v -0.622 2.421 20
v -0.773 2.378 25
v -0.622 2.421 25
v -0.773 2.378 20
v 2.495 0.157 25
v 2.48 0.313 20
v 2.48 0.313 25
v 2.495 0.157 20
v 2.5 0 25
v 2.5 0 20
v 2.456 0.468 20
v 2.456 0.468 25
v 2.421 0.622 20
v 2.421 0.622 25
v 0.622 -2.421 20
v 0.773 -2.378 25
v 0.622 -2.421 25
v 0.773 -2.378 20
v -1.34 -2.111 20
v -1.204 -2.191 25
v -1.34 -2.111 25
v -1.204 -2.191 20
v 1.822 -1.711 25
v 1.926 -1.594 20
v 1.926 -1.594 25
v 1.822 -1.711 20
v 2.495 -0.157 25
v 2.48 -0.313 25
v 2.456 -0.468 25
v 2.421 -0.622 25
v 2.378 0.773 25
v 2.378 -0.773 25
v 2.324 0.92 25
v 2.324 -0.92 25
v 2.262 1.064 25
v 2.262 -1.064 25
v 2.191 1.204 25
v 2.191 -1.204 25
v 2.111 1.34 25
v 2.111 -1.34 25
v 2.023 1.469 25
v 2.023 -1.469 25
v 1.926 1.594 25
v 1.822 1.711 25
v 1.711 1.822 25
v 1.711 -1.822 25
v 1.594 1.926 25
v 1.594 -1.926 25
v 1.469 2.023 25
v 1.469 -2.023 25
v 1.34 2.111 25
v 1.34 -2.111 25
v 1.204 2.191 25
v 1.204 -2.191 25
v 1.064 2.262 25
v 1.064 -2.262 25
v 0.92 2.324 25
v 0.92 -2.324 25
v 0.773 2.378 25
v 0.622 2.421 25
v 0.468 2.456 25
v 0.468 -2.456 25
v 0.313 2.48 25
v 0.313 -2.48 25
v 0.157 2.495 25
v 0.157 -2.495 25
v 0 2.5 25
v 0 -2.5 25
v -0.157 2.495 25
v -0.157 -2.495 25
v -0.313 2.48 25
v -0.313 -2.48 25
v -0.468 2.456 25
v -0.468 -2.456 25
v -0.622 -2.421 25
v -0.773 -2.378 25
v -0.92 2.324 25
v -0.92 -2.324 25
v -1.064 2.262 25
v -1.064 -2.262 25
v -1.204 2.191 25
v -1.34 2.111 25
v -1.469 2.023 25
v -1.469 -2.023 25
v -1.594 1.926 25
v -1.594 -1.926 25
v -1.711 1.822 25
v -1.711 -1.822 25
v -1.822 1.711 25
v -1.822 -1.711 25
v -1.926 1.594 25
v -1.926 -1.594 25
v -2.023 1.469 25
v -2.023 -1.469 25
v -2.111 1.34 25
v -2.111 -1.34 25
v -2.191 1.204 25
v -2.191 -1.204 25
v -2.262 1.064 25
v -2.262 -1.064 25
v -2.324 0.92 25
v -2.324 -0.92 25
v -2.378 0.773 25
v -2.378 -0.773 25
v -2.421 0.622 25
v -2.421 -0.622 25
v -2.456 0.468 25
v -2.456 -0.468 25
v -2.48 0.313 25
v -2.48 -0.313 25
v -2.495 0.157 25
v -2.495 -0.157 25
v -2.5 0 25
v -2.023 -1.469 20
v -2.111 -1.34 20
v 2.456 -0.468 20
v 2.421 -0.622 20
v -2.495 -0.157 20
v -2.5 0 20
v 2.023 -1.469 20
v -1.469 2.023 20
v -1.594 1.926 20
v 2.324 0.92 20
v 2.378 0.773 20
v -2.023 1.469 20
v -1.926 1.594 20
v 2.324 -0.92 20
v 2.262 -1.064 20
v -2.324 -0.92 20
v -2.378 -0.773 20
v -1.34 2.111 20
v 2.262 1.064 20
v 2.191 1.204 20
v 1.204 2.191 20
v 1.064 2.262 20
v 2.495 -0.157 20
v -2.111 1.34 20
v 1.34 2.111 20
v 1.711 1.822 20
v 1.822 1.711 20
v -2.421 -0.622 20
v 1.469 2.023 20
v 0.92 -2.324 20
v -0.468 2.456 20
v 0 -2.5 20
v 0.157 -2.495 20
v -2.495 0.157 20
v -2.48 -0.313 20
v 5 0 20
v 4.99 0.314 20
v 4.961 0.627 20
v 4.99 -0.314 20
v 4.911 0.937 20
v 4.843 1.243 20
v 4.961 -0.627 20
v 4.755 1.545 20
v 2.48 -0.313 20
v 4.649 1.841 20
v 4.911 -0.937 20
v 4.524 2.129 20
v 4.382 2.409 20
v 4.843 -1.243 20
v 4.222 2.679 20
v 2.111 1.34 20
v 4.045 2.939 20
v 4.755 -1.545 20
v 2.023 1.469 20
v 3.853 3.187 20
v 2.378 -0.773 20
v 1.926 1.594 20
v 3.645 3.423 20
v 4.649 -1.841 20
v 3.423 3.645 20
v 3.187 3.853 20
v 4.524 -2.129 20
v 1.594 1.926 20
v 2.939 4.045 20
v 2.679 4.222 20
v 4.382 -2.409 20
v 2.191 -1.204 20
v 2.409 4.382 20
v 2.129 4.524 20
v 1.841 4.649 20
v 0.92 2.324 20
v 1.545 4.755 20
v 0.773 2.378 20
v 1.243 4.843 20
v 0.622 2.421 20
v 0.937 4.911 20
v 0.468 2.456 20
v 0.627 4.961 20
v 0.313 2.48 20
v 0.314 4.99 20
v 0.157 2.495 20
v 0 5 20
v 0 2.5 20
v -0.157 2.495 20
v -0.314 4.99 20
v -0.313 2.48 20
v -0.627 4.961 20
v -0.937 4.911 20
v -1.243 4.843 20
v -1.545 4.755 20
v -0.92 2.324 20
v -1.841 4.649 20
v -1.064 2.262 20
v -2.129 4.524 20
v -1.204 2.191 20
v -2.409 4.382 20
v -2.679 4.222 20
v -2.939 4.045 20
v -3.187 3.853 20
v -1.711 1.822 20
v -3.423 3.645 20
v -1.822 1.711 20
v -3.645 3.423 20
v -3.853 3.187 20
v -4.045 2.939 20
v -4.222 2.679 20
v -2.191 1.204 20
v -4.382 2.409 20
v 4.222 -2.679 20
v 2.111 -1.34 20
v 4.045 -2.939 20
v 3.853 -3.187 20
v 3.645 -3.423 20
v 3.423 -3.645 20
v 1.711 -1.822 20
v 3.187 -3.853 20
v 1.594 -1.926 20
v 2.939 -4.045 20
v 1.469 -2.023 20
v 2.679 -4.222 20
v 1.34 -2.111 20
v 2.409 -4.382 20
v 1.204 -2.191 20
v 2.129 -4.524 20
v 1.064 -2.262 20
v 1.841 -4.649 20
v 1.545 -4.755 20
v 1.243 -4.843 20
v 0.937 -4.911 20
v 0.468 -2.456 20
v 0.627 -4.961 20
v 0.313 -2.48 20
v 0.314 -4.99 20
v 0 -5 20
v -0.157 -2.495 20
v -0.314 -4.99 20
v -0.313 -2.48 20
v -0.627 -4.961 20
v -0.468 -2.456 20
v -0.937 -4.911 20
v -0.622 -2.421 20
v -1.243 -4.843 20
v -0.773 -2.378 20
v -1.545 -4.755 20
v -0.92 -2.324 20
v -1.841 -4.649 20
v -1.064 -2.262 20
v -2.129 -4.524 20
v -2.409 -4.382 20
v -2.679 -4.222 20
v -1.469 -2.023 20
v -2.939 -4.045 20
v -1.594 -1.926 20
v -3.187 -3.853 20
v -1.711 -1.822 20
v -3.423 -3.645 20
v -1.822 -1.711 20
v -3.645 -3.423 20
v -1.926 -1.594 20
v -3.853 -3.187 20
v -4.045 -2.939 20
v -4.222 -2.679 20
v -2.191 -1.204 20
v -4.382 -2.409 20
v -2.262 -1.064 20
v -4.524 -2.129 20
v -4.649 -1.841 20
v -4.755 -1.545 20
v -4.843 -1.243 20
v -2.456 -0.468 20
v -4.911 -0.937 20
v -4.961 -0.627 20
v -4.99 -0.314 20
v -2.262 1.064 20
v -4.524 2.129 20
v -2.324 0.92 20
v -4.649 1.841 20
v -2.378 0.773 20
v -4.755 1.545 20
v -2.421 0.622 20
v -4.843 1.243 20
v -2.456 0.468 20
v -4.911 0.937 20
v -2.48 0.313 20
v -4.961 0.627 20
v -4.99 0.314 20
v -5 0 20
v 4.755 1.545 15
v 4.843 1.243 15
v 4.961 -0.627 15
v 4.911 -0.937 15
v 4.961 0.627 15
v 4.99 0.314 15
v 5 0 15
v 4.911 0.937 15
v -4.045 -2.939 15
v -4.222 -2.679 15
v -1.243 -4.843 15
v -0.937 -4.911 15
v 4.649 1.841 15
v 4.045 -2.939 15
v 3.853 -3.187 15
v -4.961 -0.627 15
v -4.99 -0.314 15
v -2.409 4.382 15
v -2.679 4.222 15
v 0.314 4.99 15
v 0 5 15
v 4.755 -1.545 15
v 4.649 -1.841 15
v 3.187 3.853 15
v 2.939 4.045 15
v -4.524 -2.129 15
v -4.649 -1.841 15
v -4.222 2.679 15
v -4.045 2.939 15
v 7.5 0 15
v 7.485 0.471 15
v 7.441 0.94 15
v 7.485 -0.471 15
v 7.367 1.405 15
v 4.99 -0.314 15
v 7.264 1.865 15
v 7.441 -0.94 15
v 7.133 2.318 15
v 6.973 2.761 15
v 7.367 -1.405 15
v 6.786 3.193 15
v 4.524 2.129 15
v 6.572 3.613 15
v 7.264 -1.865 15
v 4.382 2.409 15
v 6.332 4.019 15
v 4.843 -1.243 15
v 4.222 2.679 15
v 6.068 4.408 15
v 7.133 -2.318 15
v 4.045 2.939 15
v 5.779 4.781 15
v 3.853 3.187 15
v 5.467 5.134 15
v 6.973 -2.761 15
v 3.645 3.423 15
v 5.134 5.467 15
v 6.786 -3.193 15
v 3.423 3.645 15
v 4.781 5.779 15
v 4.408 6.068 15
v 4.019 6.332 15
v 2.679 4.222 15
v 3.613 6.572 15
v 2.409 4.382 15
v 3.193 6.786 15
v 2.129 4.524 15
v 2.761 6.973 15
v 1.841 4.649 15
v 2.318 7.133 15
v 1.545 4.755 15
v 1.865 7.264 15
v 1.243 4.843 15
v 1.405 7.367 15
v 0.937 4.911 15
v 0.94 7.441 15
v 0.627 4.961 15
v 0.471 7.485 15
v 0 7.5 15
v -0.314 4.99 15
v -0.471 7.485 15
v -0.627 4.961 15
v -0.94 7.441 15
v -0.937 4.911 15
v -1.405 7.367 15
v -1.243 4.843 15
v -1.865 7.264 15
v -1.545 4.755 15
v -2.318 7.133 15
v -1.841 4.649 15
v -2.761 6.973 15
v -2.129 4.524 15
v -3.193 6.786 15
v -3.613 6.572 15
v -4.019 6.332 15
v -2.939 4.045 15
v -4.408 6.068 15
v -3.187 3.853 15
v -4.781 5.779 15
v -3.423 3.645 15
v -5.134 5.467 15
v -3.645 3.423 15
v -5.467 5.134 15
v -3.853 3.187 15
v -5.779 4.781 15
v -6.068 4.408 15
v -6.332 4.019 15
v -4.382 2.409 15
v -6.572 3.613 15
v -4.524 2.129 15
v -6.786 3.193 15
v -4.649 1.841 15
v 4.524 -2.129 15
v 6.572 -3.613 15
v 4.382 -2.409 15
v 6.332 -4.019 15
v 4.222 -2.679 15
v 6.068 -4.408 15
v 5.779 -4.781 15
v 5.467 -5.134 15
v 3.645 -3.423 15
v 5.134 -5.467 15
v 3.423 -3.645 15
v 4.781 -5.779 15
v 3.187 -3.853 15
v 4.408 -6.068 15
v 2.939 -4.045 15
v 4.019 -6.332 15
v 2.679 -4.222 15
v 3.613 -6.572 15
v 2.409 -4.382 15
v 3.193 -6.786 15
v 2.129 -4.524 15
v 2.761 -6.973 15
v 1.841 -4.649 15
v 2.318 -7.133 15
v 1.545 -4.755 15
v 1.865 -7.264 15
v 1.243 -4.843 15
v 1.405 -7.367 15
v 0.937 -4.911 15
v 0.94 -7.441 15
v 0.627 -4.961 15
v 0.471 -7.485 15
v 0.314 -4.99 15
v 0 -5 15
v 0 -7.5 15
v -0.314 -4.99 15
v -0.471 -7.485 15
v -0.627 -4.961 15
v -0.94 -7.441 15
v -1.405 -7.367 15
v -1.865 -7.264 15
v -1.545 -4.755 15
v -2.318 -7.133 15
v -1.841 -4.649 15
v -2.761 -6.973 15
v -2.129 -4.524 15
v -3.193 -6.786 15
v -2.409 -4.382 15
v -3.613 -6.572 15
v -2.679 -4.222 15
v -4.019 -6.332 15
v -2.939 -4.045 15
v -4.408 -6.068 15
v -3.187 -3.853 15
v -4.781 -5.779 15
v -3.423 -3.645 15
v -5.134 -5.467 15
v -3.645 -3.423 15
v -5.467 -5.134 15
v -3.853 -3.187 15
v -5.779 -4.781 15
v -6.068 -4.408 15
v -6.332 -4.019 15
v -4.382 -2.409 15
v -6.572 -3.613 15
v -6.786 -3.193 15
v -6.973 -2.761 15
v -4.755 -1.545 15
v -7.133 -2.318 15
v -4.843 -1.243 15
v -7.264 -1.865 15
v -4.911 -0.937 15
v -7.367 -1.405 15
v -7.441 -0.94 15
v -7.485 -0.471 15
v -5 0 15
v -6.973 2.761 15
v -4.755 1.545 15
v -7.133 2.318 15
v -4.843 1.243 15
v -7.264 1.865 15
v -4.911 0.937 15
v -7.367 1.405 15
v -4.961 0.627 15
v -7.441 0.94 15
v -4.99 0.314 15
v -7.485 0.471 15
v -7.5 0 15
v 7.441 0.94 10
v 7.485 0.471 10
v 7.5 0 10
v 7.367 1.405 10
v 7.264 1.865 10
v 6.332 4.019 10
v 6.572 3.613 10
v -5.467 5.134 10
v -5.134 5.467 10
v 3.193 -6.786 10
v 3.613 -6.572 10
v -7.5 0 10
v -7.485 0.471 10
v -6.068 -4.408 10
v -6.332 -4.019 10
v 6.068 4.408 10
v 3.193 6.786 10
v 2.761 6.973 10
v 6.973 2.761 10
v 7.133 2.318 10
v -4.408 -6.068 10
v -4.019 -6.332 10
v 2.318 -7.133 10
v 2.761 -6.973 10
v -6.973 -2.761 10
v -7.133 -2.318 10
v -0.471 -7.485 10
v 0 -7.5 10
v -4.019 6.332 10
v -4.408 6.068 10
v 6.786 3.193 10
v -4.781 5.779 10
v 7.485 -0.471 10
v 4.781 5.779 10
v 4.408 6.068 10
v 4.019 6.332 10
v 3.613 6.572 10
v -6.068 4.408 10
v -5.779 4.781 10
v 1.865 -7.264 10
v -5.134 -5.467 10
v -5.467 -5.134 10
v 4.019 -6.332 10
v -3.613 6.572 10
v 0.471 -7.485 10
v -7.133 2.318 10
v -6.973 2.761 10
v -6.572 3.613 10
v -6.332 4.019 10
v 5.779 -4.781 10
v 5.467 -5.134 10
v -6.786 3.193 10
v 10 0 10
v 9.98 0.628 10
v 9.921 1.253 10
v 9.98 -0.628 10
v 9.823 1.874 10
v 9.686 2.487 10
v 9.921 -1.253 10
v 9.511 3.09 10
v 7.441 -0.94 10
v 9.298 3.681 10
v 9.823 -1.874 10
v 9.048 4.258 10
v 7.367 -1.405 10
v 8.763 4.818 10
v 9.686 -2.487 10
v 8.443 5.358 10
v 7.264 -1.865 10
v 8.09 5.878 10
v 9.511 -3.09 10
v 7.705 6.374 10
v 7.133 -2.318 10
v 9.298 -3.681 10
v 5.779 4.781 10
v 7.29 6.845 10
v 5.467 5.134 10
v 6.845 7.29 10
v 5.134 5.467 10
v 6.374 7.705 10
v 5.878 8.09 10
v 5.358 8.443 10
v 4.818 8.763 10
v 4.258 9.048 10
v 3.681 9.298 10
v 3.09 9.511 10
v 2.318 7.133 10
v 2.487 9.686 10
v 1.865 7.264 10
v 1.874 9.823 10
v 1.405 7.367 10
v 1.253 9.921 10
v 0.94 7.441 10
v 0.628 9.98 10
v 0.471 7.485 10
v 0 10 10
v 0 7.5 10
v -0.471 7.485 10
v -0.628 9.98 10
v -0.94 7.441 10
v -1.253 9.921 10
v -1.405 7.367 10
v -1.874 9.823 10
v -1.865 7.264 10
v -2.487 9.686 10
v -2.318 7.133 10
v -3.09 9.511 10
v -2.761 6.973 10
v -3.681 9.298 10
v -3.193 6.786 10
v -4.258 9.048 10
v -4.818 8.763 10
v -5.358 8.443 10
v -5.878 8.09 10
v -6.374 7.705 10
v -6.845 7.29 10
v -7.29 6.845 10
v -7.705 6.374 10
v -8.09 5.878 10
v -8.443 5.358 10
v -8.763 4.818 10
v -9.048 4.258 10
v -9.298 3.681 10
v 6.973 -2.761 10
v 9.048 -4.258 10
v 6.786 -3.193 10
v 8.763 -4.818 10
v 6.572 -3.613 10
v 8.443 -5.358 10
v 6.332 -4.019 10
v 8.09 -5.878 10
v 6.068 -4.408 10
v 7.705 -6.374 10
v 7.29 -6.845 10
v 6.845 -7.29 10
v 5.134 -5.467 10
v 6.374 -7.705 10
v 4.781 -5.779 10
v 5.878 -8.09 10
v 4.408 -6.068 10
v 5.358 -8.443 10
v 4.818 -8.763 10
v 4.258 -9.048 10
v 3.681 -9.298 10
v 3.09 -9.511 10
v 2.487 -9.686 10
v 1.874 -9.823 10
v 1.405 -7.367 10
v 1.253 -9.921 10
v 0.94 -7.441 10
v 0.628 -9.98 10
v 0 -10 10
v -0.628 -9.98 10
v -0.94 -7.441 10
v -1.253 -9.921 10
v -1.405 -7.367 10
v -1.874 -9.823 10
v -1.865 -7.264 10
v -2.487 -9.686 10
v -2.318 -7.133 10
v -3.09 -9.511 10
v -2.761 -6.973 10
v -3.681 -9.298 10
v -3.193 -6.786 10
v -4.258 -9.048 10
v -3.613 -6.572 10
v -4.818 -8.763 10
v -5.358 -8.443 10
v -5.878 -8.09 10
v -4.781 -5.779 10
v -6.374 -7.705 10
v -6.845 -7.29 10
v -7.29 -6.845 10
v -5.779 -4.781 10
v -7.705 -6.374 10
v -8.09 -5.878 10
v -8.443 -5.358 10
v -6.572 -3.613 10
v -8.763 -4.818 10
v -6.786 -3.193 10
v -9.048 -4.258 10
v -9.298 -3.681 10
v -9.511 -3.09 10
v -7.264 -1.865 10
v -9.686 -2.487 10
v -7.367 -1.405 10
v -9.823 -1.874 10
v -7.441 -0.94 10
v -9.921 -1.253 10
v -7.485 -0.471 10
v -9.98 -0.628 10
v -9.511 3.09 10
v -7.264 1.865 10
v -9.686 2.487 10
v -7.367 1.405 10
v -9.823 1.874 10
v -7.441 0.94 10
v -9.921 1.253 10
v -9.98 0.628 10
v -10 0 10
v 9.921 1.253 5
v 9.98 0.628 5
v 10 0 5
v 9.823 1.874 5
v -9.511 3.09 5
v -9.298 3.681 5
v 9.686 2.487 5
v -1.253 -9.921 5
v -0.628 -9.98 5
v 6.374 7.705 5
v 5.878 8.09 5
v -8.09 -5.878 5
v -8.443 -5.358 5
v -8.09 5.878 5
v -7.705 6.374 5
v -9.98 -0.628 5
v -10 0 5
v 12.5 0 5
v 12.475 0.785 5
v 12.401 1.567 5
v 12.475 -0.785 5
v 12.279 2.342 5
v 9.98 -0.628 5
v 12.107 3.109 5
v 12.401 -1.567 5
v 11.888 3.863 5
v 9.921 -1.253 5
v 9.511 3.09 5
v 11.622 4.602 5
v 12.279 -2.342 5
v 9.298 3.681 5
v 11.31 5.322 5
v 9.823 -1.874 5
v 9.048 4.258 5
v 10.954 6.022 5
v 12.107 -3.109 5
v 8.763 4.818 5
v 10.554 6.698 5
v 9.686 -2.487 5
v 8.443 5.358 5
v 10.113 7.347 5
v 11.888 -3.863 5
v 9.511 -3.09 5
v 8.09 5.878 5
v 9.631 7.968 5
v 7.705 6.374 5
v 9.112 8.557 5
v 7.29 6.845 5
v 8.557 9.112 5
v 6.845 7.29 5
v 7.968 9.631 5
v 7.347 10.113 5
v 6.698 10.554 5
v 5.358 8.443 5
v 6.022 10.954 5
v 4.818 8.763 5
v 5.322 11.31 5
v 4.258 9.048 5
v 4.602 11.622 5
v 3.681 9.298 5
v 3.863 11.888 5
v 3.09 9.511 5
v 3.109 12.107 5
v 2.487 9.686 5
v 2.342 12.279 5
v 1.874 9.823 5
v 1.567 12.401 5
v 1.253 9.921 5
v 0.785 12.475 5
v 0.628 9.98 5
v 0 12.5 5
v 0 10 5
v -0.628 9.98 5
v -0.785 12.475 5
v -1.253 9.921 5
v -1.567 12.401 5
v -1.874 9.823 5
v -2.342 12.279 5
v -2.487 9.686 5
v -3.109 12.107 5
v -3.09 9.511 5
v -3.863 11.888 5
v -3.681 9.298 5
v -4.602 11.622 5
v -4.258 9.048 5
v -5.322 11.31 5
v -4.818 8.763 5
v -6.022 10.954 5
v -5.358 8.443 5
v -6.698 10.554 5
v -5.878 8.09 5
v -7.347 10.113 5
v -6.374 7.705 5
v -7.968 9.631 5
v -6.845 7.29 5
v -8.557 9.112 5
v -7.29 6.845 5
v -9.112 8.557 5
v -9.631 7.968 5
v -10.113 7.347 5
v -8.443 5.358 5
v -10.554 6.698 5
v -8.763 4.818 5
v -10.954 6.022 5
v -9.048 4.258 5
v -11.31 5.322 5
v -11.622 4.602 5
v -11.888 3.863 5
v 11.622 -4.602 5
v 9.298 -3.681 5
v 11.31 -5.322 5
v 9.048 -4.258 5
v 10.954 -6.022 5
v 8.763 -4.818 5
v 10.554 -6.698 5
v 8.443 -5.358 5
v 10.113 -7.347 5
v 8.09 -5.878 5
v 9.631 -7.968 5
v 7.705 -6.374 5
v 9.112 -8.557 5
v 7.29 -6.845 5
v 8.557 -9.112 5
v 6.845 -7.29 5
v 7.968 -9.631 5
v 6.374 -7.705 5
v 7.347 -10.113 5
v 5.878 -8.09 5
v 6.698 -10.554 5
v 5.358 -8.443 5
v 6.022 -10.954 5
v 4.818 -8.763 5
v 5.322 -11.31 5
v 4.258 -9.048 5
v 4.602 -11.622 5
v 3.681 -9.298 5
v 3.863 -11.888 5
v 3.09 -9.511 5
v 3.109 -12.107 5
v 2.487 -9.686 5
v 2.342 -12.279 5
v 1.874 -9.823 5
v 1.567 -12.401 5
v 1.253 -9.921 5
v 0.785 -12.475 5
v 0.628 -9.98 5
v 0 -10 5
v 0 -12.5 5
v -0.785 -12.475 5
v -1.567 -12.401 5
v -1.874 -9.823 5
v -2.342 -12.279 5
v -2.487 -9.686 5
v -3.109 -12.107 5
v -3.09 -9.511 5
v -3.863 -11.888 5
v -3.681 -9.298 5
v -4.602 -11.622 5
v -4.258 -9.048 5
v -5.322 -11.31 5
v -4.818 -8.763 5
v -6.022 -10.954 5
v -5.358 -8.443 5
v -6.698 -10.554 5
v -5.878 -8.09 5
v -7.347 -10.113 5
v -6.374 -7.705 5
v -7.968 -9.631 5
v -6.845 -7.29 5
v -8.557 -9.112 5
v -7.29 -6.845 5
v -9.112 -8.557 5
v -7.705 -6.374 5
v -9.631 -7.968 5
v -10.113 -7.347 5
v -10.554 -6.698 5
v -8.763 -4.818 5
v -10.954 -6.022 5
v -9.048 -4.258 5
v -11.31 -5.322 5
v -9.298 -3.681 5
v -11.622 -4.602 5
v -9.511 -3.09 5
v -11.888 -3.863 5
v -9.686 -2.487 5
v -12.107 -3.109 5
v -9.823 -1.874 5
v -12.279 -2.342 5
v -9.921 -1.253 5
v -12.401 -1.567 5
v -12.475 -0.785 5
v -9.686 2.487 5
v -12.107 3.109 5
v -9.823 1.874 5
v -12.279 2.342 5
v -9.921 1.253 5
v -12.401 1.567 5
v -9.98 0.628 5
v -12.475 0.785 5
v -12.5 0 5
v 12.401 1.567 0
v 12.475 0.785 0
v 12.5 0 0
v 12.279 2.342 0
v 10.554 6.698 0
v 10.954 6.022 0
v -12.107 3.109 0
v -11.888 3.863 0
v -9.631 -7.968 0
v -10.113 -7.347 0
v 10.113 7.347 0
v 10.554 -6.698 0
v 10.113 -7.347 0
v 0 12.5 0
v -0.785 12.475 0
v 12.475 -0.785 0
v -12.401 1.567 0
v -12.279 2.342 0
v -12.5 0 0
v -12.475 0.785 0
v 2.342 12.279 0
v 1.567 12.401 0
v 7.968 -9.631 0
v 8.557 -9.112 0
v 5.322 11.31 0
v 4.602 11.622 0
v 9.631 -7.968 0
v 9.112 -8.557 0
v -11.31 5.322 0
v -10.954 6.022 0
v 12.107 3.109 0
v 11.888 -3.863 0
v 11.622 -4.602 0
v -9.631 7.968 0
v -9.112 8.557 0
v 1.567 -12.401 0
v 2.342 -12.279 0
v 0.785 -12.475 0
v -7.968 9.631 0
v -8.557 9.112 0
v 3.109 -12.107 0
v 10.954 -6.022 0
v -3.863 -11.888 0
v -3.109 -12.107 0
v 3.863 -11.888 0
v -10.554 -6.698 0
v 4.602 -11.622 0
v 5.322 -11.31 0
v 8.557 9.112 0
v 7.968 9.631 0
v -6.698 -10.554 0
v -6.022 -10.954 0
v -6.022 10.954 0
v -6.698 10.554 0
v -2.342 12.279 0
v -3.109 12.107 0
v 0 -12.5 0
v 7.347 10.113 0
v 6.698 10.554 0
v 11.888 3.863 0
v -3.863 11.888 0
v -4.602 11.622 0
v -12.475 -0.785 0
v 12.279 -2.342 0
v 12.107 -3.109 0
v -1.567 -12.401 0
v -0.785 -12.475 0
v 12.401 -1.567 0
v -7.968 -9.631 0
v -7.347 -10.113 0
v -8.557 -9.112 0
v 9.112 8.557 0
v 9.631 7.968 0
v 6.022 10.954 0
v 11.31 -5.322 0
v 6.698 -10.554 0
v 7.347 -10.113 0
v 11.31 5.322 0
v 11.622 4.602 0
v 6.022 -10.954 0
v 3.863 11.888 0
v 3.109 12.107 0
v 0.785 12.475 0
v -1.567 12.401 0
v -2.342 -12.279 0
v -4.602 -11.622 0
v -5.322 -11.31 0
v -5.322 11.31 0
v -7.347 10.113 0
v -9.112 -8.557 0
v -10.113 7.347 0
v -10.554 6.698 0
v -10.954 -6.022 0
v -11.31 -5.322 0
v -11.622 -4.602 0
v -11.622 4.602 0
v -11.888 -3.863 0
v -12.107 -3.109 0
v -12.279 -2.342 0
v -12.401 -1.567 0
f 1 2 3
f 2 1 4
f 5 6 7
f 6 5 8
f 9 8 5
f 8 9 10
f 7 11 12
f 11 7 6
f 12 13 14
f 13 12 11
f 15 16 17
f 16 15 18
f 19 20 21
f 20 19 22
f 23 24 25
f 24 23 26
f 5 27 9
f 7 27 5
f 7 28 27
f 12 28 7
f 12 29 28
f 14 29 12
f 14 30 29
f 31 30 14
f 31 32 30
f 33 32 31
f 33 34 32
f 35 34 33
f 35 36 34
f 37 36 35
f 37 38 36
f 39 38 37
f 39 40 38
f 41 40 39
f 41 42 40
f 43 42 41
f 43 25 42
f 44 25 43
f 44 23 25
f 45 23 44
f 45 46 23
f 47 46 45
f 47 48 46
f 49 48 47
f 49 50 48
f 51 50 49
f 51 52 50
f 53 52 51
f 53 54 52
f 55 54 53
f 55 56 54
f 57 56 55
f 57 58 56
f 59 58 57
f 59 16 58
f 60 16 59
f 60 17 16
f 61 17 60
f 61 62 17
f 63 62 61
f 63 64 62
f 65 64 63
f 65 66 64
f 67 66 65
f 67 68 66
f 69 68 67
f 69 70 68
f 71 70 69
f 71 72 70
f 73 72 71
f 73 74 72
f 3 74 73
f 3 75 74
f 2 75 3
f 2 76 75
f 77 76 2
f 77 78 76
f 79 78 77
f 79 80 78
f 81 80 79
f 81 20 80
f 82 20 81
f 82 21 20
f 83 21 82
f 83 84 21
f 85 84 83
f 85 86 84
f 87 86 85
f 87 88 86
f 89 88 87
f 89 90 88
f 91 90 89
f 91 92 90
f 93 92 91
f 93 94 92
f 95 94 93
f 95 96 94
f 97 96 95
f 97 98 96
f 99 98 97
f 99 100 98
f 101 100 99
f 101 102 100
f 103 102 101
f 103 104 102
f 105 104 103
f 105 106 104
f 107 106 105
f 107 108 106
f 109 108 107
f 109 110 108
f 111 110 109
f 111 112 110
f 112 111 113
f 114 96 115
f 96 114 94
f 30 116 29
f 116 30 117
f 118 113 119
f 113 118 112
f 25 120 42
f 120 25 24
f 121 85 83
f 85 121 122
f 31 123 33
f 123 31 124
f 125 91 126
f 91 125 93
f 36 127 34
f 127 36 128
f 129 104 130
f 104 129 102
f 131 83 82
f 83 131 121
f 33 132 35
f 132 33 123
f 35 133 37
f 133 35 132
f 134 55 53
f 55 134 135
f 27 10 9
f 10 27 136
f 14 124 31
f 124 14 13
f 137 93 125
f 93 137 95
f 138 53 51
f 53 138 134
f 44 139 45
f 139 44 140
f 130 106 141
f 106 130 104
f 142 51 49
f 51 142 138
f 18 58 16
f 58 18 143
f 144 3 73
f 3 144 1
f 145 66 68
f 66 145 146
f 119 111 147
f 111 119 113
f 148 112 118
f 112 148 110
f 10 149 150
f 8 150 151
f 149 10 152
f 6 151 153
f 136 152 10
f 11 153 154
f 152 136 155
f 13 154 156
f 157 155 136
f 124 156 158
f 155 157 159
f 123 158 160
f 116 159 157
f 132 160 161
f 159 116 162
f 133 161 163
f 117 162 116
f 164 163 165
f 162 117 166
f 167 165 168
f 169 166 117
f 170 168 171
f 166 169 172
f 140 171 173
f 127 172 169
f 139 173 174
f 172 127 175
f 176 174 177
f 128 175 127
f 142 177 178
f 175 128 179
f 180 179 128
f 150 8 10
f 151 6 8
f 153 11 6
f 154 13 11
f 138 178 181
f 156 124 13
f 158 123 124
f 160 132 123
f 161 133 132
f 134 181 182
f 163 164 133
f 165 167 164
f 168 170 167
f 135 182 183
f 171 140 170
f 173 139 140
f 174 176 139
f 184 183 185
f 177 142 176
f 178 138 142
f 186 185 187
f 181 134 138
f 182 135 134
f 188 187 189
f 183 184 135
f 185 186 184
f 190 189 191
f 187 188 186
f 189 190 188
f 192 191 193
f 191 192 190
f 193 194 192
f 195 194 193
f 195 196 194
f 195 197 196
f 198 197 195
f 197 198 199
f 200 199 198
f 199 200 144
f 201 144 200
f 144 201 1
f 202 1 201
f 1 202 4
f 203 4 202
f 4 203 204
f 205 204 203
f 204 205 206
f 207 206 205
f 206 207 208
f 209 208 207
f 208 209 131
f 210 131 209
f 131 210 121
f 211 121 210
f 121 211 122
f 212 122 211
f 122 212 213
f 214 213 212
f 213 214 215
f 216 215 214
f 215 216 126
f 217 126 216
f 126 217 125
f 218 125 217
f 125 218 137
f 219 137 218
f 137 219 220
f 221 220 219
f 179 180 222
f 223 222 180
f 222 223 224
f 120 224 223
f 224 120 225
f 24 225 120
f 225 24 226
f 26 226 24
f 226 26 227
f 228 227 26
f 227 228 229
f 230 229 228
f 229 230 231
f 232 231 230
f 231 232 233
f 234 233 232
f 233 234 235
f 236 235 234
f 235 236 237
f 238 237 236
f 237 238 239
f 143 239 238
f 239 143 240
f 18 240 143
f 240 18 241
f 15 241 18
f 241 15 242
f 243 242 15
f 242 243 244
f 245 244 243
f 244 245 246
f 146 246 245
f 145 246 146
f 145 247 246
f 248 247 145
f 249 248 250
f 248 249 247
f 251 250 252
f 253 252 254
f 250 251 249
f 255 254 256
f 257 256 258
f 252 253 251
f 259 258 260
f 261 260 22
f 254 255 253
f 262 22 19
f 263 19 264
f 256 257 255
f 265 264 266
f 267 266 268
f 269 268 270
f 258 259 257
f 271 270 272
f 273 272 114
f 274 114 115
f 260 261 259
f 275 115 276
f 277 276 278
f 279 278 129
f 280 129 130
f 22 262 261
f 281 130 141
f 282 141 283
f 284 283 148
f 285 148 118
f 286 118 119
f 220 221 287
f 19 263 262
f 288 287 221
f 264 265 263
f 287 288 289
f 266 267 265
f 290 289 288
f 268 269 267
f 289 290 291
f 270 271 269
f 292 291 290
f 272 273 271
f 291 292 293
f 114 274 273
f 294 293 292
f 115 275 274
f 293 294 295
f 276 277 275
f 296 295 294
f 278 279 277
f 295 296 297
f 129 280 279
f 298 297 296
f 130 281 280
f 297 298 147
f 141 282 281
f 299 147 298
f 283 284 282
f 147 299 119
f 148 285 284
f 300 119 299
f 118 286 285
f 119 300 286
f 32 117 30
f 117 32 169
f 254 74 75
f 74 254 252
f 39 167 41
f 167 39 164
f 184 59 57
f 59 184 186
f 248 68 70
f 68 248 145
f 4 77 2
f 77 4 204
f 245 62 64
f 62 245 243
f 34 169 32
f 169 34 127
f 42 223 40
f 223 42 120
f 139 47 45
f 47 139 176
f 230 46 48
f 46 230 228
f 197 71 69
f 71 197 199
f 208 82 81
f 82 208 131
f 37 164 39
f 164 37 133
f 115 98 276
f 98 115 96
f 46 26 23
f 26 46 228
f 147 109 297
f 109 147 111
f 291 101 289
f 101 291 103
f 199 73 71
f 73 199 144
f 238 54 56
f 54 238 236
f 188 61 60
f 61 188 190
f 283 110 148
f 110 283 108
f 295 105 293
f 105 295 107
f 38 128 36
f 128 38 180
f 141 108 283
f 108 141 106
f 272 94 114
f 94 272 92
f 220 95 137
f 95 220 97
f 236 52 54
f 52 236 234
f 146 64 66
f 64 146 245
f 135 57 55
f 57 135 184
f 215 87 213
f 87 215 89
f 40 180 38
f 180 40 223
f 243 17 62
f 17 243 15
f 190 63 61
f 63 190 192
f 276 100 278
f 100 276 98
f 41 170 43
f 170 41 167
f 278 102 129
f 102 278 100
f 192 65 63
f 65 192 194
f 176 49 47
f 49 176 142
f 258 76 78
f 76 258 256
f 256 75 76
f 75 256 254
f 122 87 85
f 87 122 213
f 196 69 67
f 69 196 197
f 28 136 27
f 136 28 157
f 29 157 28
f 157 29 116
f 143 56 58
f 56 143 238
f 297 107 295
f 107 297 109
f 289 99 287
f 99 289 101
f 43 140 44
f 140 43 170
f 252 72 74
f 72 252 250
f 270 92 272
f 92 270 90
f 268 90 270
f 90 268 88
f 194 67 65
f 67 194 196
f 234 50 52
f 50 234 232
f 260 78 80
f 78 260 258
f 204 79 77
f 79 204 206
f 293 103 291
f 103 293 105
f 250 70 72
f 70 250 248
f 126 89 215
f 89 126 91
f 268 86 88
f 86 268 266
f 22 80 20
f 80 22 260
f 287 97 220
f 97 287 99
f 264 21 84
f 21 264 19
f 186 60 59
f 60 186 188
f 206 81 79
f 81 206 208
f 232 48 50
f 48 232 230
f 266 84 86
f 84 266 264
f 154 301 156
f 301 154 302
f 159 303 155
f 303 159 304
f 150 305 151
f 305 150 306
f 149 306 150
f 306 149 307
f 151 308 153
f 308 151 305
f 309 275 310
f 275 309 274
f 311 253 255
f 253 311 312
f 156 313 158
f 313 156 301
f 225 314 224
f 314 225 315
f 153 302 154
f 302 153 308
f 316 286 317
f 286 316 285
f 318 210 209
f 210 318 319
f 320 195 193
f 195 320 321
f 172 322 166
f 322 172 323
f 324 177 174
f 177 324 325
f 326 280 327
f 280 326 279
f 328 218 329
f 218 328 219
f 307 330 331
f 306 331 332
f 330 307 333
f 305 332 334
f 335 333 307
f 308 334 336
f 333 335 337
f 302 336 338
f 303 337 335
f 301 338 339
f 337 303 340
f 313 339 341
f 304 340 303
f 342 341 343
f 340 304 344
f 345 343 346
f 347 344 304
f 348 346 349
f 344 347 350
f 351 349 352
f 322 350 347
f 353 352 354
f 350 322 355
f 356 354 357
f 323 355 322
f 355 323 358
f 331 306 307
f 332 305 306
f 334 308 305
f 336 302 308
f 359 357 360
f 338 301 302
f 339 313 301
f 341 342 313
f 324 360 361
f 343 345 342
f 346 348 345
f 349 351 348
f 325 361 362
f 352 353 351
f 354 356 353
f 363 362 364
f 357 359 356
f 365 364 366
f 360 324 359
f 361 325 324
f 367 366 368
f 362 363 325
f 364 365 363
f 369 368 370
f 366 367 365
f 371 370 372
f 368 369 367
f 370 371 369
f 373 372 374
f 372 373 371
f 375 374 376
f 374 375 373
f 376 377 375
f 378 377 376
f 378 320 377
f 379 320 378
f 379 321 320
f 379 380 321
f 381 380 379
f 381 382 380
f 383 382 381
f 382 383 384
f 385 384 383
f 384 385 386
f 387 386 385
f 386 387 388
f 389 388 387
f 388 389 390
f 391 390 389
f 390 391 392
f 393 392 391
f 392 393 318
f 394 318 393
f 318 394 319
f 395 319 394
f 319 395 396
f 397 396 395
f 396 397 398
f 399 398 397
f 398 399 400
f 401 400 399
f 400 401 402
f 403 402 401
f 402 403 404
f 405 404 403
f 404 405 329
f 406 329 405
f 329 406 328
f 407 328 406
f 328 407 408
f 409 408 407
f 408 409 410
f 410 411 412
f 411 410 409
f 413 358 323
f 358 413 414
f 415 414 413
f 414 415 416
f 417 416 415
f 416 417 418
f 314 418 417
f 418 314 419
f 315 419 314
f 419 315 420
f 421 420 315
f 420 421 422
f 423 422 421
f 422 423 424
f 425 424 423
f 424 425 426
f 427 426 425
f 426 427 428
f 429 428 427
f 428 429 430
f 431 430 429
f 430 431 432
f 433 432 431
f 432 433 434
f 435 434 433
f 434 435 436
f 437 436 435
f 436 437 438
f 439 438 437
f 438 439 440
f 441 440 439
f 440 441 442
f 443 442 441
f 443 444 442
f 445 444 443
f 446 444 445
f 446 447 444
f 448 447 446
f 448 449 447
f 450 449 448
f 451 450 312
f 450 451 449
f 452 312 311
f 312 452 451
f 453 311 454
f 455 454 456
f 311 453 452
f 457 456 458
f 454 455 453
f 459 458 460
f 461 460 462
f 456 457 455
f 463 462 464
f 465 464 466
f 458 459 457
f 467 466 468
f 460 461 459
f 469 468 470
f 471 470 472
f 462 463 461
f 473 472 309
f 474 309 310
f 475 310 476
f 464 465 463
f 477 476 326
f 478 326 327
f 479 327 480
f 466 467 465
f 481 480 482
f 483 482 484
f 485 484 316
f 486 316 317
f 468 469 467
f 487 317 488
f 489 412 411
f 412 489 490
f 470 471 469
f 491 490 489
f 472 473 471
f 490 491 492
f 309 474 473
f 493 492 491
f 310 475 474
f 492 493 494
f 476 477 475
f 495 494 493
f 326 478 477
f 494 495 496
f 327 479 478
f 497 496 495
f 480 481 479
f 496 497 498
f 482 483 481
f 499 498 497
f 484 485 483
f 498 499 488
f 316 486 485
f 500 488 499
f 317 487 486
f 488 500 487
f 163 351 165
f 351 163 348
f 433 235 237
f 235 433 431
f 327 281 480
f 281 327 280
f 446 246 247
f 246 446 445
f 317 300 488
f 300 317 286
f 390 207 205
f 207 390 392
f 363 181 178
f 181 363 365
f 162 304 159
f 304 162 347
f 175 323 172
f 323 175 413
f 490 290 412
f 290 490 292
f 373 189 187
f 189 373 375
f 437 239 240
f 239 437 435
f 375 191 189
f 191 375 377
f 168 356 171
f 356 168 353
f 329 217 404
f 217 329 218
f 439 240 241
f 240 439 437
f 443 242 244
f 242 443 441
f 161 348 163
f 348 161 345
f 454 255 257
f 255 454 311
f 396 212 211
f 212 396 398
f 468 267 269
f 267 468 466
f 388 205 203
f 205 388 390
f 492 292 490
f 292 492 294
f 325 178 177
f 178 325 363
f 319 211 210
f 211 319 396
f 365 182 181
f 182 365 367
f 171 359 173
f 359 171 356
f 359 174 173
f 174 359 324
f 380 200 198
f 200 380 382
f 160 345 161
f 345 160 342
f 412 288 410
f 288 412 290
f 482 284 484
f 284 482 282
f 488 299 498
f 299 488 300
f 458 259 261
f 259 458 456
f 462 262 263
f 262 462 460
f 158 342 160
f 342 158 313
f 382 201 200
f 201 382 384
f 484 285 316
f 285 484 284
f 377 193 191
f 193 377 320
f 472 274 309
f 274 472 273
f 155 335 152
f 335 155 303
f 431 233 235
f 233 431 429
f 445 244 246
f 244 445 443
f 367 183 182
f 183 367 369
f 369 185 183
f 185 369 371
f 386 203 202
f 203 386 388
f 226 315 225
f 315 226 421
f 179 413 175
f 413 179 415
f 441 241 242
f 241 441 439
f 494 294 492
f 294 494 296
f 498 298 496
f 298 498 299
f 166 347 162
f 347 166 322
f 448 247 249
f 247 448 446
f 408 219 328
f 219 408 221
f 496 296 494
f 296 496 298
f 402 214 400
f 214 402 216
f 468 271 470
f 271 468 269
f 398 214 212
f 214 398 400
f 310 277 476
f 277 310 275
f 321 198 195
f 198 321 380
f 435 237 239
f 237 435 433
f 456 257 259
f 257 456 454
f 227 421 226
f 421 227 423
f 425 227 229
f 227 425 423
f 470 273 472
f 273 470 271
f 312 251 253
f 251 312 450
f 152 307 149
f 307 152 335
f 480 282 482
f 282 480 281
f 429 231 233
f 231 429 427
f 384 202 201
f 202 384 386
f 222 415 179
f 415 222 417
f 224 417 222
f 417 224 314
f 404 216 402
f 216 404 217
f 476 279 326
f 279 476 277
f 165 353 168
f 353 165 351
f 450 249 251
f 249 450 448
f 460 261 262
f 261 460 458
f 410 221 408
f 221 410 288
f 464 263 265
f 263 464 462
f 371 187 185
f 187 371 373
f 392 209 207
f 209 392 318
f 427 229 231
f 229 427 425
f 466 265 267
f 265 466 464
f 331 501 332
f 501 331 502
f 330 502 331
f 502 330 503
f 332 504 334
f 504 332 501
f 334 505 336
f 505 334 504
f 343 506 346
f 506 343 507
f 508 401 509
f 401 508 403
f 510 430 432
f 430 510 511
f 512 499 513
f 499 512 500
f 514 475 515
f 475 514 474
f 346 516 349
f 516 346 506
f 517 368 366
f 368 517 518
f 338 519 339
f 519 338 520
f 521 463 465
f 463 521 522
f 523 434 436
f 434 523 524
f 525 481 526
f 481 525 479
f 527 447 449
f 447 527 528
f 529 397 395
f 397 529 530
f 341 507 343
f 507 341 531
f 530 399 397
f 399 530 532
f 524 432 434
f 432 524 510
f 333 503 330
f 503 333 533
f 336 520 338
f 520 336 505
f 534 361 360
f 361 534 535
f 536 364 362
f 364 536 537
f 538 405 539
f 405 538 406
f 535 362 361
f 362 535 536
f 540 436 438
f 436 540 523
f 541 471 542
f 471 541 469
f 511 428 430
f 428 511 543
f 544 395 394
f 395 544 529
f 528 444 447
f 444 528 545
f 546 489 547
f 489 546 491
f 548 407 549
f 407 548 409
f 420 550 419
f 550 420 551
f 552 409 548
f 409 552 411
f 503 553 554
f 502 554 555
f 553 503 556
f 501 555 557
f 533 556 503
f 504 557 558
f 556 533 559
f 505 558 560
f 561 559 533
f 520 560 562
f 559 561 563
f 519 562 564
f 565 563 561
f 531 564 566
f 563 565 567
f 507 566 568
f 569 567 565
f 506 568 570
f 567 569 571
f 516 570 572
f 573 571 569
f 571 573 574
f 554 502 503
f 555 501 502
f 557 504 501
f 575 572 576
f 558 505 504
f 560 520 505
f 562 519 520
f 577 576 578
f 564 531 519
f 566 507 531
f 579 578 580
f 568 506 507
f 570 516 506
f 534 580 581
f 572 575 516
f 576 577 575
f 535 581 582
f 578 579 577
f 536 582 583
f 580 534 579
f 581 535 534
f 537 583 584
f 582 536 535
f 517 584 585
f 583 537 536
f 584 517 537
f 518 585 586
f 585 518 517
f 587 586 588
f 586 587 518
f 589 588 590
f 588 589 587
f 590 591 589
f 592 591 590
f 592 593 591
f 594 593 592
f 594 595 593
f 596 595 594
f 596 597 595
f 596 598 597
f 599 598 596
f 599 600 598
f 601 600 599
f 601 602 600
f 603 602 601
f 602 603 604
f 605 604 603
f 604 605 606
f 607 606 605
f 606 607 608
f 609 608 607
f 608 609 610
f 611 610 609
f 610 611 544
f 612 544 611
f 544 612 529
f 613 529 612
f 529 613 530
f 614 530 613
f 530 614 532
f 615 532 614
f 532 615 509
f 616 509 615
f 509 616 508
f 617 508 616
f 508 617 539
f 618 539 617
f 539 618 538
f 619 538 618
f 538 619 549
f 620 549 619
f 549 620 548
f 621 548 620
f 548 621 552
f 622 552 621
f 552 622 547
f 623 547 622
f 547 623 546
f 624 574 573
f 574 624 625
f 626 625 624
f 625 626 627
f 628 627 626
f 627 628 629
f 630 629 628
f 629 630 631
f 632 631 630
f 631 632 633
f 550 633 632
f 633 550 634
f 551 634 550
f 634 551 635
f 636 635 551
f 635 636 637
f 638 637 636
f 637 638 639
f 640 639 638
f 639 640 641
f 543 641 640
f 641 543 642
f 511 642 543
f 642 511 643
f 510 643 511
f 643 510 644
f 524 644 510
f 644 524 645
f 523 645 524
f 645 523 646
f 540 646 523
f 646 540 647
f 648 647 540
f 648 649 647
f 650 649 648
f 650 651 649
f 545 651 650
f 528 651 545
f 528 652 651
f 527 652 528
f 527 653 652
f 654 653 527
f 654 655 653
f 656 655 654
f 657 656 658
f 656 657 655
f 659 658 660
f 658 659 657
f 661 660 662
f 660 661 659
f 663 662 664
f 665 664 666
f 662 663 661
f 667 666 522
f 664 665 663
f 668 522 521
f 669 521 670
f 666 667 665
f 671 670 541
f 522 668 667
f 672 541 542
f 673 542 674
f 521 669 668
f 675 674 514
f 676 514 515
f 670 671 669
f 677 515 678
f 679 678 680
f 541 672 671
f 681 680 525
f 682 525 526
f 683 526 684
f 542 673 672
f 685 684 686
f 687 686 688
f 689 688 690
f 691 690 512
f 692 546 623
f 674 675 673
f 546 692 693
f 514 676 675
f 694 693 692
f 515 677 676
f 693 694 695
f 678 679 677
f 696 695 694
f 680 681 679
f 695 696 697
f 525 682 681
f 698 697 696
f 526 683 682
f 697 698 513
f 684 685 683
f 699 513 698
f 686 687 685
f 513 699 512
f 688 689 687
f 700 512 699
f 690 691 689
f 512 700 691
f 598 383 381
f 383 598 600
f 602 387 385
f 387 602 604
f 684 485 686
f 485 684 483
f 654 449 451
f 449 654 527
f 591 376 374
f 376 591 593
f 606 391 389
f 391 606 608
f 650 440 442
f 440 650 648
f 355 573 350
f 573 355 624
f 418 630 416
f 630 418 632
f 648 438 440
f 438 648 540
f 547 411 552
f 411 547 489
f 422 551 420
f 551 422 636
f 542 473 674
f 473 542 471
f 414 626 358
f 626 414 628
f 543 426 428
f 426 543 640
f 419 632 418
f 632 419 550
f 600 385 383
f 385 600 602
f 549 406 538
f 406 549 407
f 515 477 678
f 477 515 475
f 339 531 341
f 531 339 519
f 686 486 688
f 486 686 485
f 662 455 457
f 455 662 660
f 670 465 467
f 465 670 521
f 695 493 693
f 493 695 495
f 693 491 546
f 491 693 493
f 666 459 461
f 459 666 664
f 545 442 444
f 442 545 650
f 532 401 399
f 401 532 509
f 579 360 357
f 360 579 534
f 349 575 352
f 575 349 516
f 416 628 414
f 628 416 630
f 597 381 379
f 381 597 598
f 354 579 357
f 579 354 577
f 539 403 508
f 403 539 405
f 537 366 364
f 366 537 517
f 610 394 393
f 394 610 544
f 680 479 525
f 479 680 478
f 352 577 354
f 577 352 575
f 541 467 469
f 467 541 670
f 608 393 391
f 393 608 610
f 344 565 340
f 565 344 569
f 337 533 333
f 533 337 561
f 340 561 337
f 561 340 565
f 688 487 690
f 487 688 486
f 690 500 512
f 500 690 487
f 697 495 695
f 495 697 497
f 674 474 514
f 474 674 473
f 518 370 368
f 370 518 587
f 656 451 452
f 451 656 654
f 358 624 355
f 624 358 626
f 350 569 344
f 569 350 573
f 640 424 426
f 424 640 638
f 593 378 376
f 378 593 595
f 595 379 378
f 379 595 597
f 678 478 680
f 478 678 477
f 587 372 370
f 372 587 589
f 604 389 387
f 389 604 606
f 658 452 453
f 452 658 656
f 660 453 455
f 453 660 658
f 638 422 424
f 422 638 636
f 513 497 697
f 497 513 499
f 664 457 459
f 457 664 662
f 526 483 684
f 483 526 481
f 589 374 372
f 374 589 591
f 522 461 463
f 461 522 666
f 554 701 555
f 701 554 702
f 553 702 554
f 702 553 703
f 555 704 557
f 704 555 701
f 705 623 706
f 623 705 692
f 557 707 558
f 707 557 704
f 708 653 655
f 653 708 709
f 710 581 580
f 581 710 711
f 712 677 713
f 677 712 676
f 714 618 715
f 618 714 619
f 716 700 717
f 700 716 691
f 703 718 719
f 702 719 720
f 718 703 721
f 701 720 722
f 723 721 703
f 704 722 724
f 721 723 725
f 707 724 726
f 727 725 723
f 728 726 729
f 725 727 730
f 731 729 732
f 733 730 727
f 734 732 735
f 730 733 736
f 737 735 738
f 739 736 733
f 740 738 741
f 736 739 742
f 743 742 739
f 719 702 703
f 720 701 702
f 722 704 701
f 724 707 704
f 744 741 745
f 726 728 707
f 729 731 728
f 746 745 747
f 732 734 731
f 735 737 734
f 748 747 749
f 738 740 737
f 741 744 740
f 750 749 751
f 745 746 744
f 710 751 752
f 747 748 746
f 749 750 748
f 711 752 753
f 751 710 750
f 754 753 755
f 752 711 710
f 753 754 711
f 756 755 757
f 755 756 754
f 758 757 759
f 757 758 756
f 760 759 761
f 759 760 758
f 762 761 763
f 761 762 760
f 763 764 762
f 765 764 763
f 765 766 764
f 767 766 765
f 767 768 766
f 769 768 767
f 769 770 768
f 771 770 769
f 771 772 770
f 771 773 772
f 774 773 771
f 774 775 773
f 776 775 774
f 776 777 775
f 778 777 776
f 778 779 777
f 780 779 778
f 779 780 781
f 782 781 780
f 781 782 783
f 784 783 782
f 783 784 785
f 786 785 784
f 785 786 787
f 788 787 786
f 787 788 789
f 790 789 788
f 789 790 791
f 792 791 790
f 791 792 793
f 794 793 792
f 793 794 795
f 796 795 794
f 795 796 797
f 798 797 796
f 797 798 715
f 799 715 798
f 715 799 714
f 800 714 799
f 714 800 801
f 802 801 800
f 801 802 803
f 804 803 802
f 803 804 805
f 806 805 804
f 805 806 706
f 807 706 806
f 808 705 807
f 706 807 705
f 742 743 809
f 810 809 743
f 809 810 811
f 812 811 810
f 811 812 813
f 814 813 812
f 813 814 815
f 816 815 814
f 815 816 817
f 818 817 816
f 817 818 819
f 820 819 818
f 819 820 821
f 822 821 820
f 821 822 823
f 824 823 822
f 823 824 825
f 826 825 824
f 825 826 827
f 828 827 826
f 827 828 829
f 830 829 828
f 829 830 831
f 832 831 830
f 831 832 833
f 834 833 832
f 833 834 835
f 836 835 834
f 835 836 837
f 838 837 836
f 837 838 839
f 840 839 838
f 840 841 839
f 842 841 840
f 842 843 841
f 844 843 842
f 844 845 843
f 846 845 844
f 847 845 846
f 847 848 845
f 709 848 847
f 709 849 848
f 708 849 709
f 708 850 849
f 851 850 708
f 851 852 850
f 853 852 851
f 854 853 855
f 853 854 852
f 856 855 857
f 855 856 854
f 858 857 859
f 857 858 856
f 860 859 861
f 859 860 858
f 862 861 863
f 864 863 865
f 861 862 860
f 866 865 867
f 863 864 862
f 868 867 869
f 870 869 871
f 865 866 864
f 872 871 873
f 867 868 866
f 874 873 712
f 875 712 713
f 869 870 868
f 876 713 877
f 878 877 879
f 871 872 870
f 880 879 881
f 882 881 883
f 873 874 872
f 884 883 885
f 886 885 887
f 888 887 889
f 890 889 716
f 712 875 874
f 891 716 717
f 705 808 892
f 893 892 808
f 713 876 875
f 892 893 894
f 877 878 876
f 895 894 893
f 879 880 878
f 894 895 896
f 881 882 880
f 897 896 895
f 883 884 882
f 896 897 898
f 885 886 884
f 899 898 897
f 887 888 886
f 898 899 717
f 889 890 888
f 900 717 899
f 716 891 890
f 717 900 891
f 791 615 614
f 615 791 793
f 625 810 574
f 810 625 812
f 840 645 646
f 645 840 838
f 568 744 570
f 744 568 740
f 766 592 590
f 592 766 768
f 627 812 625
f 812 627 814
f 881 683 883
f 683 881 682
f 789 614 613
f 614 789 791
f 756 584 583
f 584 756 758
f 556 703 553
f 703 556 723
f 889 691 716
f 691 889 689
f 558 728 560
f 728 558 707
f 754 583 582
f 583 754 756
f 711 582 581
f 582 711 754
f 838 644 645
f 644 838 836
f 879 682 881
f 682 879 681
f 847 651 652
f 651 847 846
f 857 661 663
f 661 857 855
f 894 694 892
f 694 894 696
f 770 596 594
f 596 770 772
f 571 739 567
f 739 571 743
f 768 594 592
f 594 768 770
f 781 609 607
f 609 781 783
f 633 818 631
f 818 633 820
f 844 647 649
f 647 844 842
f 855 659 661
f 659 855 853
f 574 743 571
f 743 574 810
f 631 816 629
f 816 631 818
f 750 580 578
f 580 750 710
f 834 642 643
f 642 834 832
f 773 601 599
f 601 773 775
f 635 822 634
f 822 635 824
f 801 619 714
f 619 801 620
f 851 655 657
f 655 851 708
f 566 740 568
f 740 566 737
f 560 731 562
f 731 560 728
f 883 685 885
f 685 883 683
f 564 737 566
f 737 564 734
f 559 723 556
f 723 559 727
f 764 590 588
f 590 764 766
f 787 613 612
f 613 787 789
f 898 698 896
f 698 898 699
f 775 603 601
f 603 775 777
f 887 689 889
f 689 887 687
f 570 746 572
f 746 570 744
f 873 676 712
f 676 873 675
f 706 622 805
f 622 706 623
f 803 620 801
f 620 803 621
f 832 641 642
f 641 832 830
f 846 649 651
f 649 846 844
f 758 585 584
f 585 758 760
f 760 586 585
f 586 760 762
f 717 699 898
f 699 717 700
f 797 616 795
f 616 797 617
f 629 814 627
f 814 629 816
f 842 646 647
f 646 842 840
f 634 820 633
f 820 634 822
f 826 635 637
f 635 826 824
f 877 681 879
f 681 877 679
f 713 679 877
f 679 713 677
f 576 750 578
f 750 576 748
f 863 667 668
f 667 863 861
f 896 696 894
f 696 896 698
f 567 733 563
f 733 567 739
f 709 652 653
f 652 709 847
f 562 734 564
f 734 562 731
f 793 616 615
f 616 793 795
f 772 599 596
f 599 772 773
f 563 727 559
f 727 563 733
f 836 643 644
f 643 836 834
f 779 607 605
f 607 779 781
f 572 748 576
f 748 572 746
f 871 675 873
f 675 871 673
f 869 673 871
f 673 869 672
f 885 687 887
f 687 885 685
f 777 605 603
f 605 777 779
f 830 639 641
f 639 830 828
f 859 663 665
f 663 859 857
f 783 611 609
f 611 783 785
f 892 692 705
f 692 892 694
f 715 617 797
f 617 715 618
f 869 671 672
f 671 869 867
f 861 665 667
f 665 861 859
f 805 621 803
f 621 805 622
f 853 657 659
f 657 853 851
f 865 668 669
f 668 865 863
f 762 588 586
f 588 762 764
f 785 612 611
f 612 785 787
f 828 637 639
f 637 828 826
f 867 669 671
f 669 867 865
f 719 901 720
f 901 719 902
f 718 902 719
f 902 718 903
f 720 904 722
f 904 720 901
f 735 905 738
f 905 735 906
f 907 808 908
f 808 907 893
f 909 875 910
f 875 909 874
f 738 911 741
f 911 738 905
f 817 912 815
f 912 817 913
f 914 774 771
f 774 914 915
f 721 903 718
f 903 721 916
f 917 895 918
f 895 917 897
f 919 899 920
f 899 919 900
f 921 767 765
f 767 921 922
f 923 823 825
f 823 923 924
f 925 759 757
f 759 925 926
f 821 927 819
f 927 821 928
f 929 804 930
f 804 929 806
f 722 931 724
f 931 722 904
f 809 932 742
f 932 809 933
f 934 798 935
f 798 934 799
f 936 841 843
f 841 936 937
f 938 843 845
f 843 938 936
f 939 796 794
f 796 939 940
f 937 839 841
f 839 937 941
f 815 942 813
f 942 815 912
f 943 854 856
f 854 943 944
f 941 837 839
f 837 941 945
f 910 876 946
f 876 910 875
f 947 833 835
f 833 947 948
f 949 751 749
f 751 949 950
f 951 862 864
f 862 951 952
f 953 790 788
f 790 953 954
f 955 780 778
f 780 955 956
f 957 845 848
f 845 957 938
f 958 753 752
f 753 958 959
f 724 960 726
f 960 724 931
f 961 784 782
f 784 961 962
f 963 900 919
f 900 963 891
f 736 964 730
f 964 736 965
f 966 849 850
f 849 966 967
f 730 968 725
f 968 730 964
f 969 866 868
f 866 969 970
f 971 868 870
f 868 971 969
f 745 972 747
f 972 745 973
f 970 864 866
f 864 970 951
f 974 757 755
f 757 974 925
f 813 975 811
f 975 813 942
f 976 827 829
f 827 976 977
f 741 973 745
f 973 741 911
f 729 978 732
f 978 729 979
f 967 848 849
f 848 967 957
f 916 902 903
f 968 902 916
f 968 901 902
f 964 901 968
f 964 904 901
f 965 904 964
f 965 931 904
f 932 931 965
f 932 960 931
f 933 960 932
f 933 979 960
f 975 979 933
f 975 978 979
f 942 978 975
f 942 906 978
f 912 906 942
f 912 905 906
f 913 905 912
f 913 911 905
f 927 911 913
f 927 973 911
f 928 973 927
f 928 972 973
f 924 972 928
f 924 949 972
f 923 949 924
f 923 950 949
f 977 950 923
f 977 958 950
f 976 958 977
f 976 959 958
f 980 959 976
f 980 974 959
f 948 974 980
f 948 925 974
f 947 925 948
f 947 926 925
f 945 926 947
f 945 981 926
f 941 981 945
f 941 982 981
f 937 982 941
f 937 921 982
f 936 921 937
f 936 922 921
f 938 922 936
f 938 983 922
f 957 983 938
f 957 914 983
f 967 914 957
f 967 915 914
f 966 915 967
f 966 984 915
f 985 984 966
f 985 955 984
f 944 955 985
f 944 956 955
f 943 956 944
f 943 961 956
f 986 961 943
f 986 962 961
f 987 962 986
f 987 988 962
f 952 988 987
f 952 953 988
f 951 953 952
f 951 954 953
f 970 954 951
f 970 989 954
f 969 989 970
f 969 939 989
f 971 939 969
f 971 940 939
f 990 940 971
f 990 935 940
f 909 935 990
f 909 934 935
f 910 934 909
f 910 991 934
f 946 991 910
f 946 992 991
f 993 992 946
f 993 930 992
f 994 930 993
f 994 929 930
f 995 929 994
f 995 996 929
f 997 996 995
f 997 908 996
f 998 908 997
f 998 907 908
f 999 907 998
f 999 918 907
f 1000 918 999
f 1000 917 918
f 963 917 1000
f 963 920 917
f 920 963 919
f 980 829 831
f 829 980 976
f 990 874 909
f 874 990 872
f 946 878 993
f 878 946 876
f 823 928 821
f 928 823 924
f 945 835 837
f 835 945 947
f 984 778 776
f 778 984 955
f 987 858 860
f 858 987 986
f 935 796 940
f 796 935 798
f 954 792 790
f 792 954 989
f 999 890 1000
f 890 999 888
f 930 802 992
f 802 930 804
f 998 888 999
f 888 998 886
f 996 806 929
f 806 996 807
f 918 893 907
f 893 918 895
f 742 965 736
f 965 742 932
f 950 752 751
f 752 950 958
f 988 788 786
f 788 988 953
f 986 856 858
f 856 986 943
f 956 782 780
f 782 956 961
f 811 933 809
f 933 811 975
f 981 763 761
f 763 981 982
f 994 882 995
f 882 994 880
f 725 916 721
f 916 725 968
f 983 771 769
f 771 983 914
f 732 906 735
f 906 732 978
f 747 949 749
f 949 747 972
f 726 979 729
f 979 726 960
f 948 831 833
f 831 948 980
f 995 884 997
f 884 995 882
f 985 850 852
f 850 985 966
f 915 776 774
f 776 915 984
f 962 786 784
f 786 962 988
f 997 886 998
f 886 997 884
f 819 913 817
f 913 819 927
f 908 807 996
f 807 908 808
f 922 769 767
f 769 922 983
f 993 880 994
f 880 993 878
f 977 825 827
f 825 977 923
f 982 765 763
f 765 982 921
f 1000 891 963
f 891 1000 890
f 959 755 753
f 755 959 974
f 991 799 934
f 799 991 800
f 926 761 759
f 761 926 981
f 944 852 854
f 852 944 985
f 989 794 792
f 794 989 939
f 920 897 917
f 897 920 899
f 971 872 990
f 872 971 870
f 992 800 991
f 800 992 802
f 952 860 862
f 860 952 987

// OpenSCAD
$fn=100;

for(i=[5:5:25]){
    translate([0,0,25-i])
    cylinder(d=i, h=5);
}    
